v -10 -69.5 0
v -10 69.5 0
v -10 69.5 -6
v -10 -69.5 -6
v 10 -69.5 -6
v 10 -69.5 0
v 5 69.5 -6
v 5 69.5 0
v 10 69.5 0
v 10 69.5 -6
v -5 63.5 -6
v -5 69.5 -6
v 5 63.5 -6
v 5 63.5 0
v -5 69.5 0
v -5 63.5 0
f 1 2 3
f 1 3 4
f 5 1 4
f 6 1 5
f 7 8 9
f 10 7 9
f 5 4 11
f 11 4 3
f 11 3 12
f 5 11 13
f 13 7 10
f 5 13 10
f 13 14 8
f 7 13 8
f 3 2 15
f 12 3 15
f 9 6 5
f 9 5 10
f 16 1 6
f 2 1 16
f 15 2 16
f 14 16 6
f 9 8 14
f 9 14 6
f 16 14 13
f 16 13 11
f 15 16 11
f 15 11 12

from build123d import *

# Parameters (mm, degrees)
SKETCH1_W           = 5
SKETCH1_H           = 6
BOSS_EXTRUDE1_DEPTH = 6


with BuildPart() as part:
    # Sketch1 → Boss-Extrude1 (new body)
    with BuildSketch(Plane.XY):
        Polygon((0, 63.5), (-5, 63.5), (-10, 63.5), (-10, -69.5), (10, -69.5), (10, 63.5), (5, 63.5), align=None)
        with Locations((-7.5, 66.5)):
            Rectangle(SKETCH1_W, SKETCH1_H)
        with Locations((7.5, 66.5)):
            Rectangle(SKETCH1_W, SKETCH1_H)
    extrude(amount=-BOSS_EXTRUDE1_DEPTH)


solid = part.part
